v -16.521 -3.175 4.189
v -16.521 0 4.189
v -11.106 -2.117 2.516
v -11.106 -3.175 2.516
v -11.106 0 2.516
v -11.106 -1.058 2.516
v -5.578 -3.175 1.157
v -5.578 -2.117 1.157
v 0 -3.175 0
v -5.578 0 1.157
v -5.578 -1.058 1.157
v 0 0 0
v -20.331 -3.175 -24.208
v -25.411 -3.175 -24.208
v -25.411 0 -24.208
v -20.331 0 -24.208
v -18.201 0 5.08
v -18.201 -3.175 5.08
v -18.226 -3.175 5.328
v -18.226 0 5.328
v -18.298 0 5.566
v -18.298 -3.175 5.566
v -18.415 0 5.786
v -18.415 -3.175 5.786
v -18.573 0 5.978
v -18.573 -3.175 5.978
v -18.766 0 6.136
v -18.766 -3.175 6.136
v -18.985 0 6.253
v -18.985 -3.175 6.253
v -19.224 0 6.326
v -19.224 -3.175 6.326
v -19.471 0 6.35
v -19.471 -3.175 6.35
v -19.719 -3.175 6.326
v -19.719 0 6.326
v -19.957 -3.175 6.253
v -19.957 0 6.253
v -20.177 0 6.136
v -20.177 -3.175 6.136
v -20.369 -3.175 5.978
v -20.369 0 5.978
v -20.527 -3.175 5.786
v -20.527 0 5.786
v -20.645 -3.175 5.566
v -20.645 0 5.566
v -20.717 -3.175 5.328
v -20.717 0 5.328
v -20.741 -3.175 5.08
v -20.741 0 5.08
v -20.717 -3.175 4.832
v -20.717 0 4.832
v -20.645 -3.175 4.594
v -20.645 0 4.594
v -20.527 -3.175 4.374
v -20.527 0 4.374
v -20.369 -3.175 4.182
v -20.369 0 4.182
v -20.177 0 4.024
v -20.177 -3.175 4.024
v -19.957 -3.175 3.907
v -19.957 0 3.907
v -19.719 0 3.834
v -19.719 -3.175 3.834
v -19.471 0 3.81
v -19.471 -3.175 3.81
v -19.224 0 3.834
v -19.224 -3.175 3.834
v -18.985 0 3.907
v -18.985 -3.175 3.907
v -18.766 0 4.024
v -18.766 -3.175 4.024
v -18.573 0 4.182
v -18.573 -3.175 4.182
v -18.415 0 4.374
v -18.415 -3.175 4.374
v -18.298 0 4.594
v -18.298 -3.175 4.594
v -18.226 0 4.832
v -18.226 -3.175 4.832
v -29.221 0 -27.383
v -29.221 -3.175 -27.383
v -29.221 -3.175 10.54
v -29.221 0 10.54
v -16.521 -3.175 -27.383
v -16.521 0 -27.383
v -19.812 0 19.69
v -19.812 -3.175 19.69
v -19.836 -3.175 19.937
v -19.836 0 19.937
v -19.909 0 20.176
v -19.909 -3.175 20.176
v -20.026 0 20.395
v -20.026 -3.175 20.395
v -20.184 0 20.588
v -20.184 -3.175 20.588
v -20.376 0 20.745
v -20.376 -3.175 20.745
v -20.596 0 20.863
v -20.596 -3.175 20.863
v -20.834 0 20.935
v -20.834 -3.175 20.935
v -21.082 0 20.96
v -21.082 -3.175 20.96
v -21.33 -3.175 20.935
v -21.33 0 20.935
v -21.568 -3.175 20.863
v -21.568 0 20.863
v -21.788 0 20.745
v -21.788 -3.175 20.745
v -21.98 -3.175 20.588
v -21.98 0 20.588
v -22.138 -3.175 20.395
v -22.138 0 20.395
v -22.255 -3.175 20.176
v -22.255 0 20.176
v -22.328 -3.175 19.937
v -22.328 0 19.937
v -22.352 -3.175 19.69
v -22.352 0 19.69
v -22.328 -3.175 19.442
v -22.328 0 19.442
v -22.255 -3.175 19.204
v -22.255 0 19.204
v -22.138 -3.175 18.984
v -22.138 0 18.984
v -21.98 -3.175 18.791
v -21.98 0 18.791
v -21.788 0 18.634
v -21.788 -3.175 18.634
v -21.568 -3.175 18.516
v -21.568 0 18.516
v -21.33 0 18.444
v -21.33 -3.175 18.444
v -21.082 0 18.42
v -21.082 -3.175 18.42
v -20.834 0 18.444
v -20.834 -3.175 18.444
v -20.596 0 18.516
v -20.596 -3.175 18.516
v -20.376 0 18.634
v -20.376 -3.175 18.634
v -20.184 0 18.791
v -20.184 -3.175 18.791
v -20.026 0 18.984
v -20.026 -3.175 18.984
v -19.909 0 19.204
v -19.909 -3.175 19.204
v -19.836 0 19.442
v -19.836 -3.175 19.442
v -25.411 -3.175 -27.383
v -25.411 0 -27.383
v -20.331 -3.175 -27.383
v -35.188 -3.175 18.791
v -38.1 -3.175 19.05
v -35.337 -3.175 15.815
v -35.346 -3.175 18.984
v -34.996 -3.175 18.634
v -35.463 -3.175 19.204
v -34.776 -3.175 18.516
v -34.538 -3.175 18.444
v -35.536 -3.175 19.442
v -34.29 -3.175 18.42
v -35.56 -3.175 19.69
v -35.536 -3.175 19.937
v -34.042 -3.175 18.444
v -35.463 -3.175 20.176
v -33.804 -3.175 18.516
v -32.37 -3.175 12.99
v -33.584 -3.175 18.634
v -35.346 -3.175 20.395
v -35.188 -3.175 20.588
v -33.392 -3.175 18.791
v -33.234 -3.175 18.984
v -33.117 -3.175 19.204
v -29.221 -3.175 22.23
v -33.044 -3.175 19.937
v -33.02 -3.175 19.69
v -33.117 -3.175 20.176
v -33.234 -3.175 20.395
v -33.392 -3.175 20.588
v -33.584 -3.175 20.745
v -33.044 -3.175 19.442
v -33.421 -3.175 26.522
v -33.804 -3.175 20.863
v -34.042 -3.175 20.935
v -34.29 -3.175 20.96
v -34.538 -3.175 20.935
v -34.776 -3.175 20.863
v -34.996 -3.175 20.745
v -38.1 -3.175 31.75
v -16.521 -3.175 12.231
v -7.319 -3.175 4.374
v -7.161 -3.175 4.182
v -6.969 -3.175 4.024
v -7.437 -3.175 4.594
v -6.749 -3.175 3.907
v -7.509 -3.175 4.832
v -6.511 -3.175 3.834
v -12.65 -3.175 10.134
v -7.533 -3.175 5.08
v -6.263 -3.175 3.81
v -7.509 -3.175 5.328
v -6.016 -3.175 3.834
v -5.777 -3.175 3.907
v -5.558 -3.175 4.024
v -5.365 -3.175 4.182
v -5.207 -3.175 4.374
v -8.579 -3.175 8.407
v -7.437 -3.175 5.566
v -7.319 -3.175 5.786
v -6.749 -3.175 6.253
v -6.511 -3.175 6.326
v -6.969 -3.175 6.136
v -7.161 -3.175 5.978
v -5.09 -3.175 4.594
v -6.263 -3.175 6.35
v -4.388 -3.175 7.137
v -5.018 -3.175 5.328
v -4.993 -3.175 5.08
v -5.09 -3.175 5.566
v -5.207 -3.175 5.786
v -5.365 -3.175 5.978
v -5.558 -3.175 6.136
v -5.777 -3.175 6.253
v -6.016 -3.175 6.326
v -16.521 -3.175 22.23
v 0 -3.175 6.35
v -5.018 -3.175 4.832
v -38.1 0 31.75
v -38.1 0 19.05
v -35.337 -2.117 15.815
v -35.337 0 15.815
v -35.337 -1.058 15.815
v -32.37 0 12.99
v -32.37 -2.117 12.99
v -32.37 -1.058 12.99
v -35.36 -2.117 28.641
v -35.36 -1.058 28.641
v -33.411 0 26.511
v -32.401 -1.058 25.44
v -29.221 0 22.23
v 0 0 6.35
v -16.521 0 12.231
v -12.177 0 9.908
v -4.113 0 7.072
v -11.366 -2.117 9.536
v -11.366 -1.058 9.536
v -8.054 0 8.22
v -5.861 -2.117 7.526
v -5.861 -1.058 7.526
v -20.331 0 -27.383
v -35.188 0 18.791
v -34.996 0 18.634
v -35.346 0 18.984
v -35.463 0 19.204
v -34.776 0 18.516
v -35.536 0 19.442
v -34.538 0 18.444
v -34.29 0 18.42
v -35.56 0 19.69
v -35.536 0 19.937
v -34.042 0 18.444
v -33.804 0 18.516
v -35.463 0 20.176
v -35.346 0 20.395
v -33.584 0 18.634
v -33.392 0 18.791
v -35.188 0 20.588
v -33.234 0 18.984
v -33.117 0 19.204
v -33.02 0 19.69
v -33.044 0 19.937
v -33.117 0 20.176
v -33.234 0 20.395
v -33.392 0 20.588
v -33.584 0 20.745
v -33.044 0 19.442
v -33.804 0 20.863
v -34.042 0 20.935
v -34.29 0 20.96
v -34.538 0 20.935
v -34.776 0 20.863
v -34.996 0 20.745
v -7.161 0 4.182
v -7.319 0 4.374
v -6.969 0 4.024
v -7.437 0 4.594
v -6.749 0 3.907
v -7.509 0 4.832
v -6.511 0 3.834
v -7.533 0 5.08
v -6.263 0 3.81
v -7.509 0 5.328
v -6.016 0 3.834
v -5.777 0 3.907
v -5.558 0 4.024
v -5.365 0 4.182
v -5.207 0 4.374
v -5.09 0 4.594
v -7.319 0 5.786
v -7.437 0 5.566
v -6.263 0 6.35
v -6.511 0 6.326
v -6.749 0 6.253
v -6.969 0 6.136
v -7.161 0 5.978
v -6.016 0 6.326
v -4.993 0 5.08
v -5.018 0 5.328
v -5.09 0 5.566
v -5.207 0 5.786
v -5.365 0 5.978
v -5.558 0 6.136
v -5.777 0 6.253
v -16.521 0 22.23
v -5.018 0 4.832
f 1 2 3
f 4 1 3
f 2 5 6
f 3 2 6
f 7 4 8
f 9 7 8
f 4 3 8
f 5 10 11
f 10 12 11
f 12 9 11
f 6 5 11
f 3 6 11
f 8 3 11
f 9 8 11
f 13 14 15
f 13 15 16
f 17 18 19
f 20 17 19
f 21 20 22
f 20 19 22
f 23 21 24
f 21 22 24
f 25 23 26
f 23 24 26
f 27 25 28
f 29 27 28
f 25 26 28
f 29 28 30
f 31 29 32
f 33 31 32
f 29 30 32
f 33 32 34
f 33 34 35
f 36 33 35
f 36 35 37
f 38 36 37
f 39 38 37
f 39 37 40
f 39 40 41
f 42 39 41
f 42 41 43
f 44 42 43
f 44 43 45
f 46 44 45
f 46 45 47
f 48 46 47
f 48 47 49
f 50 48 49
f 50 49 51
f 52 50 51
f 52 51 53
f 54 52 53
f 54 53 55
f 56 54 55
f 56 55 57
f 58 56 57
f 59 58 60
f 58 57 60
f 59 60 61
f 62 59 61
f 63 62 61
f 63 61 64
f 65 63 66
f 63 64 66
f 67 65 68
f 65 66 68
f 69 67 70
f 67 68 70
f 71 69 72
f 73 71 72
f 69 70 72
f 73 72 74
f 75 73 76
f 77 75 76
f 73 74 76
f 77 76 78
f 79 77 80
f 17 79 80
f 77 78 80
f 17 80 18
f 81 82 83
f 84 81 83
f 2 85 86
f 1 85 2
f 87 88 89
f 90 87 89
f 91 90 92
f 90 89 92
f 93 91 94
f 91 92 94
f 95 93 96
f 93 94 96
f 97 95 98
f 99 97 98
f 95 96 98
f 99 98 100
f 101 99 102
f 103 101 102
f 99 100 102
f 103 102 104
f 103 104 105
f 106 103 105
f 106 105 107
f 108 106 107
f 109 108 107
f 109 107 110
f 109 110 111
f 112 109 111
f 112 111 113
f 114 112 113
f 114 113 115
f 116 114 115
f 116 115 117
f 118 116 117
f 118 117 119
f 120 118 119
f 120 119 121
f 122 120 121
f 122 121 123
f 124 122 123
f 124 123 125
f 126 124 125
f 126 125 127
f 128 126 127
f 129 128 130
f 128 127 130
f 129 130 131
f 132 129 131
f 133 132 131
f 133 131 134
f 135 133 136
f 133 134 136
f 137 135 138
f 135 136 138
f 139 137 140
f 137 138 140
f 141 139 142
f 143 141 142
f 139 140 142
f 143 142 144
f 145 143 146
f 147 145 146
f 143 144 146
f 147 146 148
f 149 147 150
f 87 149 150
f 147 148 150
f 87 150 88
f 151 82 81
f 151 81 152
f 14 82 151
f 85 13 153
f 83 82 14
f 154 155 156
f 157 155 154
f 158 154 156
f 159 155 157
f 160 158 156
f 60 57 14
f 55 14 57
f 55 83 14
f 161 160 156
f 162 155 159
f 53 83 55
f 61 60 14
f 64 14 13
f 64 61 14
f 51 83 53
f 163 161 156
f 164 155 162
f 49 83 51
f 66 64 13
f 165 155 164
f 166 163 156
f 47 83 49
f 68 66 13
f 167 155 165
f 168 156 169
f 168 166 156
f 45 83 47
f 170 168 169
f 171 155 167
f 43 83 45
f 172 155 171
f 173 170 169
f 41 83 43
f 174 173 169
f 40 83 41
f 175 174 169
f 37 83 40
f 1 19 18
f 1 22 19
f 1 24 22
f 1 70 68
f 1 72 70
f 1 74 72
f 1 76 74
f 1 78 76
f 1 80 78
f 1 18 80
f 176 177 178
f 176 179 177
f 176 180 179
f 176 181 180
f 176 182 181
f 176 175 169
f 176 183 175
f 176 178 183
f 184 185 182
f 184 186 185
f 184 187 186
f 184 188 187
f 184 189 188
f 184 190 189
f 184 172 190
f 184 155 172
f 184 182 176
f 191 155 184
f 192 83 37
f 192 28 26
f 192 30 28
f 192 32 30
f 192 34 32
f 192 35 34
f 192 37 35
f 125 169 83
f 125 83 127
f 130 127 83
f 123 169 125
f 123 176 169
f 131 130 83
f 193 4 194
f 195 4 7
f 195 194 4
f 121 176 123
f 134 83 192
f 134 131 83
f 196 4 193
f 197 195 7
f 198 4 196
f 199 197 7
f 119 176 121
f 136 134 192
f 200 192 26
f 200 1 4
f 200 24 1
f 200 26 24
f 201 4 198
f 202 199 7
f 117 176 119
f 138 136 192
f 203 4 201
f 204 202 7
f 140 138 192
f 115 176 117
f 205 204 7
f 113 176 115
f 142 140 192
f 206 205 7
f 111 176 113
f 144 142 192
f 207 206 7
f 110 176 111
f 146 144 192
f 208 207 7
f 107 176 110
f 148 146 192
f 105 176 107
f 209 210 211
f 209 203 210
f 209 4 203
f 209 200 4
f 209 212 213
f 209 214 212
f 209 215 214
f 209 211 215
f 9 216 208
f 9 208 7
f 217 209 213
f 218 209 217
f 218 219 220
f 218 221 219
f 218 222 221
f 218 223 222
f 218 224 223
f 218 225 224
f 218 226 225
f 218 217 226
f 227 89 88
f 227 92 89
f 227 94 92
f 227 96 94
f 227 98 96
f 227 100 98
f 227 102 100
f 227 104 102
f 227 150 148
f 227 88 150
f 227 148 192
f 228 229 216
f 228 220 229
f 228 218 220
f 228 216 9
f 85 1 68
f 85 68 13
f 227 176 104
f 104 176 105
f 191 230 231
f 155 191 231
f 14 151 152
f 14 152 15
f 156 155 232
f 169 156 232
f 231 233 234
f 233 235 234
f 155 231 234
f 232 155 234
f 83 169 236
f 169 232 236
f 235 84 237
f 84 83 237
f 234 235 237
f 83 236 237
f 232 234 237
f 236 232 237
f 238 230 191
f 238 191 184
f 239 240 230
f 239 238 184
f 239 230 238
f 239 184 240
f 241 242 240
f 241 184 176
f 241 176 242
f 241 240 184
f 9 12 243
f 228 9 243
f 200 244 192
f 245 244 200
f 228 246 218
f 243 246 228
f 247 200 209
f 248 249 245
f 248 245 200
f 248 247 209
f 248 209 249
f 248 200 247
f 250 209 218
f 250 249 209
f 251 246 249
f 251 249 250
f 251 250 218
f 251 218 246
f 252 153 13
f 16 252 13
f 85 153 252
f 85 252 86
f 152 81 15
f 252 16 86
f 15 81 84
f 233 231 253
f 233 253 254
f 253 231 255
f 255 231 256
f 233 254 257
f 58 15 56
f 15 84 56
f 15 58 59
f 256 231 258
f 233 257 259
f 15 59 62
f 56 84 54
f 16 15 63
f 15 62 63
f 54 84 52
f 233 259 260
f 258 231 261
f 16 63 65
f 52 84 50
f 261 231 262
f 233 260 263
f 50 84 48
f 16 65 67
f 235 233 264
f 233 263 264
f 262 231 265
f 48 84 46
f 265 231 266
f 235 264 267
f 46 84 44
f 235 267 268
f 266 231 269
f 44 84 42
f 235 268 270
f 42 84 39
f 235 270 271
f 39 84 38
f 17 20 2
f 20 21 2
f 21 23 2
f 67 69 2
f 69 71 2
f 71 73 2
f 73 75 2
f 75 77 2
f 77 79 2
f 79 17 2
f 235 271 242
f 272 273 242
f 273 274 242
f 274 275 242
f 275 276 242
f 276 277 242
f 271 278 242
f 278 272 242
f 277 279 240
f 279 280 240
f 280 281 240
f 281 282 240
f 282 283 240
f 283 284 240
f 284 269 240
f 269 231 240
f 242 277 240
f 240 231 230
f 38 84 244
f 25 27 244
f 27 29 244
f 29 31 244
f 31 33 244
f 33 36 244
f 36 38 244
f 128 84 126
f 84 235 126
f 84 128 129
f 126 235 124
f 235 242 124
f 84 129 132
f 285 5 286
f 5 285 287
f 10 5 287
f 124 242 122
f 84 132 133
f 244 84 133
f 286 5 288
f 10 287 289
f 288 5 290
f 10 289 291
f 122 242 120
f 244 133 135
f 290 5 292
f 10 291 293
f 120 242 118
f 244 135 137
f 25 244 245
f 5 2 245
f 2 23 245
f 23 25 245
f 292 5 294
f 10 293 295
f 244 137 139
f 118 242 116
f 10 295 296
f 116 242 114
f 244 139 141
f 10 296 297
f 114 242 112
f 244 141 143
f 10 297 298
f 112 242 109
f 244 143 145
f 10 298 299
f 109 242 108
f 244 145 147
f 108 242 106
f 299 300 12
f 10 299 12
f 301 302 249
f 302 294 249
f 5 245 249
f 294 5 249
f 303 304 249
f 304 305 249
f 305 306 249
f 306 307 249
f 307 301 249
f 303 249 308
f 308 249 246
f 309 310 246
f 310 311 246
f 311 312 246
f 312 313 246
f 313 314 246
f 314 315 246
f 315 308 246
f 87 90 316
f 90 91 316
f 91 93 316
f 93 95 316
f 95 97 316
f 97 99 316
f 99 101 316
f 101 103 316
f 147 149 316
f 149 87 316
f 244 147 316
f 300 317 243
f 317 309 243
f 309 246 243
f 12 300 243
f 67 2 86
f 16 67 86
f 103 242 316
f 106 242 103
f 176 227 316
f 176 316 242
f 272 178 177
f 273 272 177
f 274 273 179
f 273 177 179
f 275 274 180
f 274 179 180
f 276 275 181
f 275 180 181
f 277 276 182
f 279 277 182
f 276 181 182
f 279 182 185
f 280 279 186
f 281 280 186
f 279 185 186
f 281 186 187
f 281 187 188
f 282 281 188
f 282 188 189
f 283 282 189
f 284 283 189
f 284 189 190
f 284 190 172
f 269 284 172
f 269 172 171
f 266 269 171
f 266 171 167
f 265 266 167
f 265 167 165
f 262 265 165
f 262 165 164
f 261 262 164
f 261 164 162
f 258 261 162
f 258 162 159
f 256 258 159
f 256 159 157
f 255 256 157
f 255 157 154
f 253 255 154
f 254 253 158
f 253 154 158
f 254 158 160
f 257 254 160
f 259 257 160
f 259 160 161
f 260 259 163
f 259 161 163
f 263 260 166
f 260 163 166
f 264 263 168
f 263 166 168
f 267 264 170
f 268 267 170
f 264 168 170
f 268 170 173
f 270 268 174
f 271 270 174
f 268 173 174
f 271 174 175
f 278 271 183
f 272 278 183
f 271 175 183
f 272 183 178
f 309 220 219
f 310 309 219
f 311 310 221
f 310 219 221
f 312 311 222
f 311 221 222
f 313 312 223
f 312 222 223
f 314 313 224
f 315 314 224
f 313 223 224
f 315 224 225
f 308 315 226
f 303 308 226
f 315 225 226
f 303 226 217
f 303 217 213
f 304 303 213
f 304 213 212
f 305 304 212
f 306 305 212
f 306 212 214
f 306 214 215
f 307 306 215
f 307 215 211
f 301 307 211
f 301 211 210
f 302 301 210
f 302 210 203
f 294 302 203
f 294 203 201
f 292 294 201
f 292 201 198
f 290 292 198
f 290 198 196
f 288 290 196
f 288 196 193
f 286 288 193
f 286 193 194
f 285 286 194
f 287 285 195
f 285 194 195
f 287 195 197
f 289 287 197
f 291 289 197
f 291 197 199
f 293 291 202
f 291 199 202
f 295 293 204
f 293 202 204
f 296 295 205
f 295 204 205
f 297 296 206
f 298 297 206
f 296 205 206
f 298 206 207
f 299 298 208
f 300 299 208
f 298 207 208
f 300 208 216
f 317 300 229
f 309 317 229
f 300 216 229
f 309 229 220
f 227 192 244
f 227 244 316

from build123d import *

# Parameters (mm, degrees)
F1_DEPTH  = 3.175
F2_W      = 12.7
F2_H      = 39.6141249724
F3_DEPTH  = 3.175
F5_DEPTH  = 3.175
F6_R      = 1.27
F7_DEPTH  = 3.1760001
F8_R      = 1.27
F9_DEPTH  = 3.1760001
F10_W     = 5.08
F10_H     = 6.35
F11_DEPTH = 25.4


with BuildPart() as f1:
    # F0 (on Front) → F1 (new body)
    with BuildSketch(Plane.XZ):
        with BuildLine():
            add(Edge.make_bspline(
                [(-38.1, 19.05), (-28.3741913736, 6.3939620741), (-14.1141656786, 2.7637183666), (0, 0)],
                knots=[0, 0, 0, 0, 42.5970949714, 42.5970949714, 42.5970949714, 42.5970949714], degree=3))
            Line((0, 0), (0, 6.35))
            add(Edge.make_bspline(
                [(-38.1, 31.75), (-29.2279217392, 21.5179808438), (-16.6689809412, 8.3035267889), (0, 6.35)],
                knots=[0, 0, 0, 0, 45.7905011984, 45.7905011984, 45.7905011984, 45.7905011984], degree=3))
            Line((-38.1, 31.75), (-38.1, 19.05))
        make_face()
    extrude(amount=F1_DEPTH)

    # F2 (on face) → F3 (join, through all)
    with BuildSketch(Plane.XZ.offset(3.175)):
        with Locations((-22.8709825013, -7.5756740422)):
            Rectangle(F2_W, F2_H)
    extrude(amount=-F3_DEPTH)

    # F4 (on face) → F5 (join, through all)
    with BuildSketch(Plane.XZ.offset(3.175)):
        with BuildLine():
            Line((-16.5209825013, 22.2295189018), (-29.2209825013, 22.2295189018))
            add(Edge.make_bspline(
                [(-16.5209825013, 12.2313884441), (-21.2089143391, 15.0429542082), (-25.4366525194, 18.5639866867), (-29.2209825013, 22.2295189018)],
                knots=[45.7905011984, 45.7905011984, 45.7905011984, 45.7905011984, 61.4068288598, 61.4068288598, 61.4068288598, 61.4068288598], degree=3))
            Line((-16.5209825013, 12.2313884441), (-16.5209825013, 22.2295189018))
        make_face()
    extrude(amount=-F5_DEPTH)

    # F6 (on face) → F7 (cut, through all)
    with BuildSketch(Plane.XZ.offset(3.175)):
        with Locations((-34.29, 19.6895189018)):
            Circle(F6_R)
        with Locations((-21.082, 19.6895189018)):
            Circle(F6_R)
    extrude(amount=-F7_DEPTH, mode=Mode.SUBTRACT)

    # F8 (on face) → F9 (cut, through all)
    with BuildSketch(Plane.XZ.offset(3.175)):
        with Locations((-19.4714572281, 5.08)):
            Circle(F8_R)
        with Locations((-6.2634572281, 5.08)):
            Circle(F8_R)
    extrude(amount=-F9_DEPTH, mode=Mode.SUBTRACT)

    # F10 (on face) → F11 (cut)
    with BuildSketch(Plane.XZ.offset(3.175)):
        with Locations((-22.8709825013, -27.3827365284)):
            Rectangle(F10_W, F10_H)
    extrude(amount=-F11_DEPTH, mode=Mode.SUBTRACT)


solid = f1.part
